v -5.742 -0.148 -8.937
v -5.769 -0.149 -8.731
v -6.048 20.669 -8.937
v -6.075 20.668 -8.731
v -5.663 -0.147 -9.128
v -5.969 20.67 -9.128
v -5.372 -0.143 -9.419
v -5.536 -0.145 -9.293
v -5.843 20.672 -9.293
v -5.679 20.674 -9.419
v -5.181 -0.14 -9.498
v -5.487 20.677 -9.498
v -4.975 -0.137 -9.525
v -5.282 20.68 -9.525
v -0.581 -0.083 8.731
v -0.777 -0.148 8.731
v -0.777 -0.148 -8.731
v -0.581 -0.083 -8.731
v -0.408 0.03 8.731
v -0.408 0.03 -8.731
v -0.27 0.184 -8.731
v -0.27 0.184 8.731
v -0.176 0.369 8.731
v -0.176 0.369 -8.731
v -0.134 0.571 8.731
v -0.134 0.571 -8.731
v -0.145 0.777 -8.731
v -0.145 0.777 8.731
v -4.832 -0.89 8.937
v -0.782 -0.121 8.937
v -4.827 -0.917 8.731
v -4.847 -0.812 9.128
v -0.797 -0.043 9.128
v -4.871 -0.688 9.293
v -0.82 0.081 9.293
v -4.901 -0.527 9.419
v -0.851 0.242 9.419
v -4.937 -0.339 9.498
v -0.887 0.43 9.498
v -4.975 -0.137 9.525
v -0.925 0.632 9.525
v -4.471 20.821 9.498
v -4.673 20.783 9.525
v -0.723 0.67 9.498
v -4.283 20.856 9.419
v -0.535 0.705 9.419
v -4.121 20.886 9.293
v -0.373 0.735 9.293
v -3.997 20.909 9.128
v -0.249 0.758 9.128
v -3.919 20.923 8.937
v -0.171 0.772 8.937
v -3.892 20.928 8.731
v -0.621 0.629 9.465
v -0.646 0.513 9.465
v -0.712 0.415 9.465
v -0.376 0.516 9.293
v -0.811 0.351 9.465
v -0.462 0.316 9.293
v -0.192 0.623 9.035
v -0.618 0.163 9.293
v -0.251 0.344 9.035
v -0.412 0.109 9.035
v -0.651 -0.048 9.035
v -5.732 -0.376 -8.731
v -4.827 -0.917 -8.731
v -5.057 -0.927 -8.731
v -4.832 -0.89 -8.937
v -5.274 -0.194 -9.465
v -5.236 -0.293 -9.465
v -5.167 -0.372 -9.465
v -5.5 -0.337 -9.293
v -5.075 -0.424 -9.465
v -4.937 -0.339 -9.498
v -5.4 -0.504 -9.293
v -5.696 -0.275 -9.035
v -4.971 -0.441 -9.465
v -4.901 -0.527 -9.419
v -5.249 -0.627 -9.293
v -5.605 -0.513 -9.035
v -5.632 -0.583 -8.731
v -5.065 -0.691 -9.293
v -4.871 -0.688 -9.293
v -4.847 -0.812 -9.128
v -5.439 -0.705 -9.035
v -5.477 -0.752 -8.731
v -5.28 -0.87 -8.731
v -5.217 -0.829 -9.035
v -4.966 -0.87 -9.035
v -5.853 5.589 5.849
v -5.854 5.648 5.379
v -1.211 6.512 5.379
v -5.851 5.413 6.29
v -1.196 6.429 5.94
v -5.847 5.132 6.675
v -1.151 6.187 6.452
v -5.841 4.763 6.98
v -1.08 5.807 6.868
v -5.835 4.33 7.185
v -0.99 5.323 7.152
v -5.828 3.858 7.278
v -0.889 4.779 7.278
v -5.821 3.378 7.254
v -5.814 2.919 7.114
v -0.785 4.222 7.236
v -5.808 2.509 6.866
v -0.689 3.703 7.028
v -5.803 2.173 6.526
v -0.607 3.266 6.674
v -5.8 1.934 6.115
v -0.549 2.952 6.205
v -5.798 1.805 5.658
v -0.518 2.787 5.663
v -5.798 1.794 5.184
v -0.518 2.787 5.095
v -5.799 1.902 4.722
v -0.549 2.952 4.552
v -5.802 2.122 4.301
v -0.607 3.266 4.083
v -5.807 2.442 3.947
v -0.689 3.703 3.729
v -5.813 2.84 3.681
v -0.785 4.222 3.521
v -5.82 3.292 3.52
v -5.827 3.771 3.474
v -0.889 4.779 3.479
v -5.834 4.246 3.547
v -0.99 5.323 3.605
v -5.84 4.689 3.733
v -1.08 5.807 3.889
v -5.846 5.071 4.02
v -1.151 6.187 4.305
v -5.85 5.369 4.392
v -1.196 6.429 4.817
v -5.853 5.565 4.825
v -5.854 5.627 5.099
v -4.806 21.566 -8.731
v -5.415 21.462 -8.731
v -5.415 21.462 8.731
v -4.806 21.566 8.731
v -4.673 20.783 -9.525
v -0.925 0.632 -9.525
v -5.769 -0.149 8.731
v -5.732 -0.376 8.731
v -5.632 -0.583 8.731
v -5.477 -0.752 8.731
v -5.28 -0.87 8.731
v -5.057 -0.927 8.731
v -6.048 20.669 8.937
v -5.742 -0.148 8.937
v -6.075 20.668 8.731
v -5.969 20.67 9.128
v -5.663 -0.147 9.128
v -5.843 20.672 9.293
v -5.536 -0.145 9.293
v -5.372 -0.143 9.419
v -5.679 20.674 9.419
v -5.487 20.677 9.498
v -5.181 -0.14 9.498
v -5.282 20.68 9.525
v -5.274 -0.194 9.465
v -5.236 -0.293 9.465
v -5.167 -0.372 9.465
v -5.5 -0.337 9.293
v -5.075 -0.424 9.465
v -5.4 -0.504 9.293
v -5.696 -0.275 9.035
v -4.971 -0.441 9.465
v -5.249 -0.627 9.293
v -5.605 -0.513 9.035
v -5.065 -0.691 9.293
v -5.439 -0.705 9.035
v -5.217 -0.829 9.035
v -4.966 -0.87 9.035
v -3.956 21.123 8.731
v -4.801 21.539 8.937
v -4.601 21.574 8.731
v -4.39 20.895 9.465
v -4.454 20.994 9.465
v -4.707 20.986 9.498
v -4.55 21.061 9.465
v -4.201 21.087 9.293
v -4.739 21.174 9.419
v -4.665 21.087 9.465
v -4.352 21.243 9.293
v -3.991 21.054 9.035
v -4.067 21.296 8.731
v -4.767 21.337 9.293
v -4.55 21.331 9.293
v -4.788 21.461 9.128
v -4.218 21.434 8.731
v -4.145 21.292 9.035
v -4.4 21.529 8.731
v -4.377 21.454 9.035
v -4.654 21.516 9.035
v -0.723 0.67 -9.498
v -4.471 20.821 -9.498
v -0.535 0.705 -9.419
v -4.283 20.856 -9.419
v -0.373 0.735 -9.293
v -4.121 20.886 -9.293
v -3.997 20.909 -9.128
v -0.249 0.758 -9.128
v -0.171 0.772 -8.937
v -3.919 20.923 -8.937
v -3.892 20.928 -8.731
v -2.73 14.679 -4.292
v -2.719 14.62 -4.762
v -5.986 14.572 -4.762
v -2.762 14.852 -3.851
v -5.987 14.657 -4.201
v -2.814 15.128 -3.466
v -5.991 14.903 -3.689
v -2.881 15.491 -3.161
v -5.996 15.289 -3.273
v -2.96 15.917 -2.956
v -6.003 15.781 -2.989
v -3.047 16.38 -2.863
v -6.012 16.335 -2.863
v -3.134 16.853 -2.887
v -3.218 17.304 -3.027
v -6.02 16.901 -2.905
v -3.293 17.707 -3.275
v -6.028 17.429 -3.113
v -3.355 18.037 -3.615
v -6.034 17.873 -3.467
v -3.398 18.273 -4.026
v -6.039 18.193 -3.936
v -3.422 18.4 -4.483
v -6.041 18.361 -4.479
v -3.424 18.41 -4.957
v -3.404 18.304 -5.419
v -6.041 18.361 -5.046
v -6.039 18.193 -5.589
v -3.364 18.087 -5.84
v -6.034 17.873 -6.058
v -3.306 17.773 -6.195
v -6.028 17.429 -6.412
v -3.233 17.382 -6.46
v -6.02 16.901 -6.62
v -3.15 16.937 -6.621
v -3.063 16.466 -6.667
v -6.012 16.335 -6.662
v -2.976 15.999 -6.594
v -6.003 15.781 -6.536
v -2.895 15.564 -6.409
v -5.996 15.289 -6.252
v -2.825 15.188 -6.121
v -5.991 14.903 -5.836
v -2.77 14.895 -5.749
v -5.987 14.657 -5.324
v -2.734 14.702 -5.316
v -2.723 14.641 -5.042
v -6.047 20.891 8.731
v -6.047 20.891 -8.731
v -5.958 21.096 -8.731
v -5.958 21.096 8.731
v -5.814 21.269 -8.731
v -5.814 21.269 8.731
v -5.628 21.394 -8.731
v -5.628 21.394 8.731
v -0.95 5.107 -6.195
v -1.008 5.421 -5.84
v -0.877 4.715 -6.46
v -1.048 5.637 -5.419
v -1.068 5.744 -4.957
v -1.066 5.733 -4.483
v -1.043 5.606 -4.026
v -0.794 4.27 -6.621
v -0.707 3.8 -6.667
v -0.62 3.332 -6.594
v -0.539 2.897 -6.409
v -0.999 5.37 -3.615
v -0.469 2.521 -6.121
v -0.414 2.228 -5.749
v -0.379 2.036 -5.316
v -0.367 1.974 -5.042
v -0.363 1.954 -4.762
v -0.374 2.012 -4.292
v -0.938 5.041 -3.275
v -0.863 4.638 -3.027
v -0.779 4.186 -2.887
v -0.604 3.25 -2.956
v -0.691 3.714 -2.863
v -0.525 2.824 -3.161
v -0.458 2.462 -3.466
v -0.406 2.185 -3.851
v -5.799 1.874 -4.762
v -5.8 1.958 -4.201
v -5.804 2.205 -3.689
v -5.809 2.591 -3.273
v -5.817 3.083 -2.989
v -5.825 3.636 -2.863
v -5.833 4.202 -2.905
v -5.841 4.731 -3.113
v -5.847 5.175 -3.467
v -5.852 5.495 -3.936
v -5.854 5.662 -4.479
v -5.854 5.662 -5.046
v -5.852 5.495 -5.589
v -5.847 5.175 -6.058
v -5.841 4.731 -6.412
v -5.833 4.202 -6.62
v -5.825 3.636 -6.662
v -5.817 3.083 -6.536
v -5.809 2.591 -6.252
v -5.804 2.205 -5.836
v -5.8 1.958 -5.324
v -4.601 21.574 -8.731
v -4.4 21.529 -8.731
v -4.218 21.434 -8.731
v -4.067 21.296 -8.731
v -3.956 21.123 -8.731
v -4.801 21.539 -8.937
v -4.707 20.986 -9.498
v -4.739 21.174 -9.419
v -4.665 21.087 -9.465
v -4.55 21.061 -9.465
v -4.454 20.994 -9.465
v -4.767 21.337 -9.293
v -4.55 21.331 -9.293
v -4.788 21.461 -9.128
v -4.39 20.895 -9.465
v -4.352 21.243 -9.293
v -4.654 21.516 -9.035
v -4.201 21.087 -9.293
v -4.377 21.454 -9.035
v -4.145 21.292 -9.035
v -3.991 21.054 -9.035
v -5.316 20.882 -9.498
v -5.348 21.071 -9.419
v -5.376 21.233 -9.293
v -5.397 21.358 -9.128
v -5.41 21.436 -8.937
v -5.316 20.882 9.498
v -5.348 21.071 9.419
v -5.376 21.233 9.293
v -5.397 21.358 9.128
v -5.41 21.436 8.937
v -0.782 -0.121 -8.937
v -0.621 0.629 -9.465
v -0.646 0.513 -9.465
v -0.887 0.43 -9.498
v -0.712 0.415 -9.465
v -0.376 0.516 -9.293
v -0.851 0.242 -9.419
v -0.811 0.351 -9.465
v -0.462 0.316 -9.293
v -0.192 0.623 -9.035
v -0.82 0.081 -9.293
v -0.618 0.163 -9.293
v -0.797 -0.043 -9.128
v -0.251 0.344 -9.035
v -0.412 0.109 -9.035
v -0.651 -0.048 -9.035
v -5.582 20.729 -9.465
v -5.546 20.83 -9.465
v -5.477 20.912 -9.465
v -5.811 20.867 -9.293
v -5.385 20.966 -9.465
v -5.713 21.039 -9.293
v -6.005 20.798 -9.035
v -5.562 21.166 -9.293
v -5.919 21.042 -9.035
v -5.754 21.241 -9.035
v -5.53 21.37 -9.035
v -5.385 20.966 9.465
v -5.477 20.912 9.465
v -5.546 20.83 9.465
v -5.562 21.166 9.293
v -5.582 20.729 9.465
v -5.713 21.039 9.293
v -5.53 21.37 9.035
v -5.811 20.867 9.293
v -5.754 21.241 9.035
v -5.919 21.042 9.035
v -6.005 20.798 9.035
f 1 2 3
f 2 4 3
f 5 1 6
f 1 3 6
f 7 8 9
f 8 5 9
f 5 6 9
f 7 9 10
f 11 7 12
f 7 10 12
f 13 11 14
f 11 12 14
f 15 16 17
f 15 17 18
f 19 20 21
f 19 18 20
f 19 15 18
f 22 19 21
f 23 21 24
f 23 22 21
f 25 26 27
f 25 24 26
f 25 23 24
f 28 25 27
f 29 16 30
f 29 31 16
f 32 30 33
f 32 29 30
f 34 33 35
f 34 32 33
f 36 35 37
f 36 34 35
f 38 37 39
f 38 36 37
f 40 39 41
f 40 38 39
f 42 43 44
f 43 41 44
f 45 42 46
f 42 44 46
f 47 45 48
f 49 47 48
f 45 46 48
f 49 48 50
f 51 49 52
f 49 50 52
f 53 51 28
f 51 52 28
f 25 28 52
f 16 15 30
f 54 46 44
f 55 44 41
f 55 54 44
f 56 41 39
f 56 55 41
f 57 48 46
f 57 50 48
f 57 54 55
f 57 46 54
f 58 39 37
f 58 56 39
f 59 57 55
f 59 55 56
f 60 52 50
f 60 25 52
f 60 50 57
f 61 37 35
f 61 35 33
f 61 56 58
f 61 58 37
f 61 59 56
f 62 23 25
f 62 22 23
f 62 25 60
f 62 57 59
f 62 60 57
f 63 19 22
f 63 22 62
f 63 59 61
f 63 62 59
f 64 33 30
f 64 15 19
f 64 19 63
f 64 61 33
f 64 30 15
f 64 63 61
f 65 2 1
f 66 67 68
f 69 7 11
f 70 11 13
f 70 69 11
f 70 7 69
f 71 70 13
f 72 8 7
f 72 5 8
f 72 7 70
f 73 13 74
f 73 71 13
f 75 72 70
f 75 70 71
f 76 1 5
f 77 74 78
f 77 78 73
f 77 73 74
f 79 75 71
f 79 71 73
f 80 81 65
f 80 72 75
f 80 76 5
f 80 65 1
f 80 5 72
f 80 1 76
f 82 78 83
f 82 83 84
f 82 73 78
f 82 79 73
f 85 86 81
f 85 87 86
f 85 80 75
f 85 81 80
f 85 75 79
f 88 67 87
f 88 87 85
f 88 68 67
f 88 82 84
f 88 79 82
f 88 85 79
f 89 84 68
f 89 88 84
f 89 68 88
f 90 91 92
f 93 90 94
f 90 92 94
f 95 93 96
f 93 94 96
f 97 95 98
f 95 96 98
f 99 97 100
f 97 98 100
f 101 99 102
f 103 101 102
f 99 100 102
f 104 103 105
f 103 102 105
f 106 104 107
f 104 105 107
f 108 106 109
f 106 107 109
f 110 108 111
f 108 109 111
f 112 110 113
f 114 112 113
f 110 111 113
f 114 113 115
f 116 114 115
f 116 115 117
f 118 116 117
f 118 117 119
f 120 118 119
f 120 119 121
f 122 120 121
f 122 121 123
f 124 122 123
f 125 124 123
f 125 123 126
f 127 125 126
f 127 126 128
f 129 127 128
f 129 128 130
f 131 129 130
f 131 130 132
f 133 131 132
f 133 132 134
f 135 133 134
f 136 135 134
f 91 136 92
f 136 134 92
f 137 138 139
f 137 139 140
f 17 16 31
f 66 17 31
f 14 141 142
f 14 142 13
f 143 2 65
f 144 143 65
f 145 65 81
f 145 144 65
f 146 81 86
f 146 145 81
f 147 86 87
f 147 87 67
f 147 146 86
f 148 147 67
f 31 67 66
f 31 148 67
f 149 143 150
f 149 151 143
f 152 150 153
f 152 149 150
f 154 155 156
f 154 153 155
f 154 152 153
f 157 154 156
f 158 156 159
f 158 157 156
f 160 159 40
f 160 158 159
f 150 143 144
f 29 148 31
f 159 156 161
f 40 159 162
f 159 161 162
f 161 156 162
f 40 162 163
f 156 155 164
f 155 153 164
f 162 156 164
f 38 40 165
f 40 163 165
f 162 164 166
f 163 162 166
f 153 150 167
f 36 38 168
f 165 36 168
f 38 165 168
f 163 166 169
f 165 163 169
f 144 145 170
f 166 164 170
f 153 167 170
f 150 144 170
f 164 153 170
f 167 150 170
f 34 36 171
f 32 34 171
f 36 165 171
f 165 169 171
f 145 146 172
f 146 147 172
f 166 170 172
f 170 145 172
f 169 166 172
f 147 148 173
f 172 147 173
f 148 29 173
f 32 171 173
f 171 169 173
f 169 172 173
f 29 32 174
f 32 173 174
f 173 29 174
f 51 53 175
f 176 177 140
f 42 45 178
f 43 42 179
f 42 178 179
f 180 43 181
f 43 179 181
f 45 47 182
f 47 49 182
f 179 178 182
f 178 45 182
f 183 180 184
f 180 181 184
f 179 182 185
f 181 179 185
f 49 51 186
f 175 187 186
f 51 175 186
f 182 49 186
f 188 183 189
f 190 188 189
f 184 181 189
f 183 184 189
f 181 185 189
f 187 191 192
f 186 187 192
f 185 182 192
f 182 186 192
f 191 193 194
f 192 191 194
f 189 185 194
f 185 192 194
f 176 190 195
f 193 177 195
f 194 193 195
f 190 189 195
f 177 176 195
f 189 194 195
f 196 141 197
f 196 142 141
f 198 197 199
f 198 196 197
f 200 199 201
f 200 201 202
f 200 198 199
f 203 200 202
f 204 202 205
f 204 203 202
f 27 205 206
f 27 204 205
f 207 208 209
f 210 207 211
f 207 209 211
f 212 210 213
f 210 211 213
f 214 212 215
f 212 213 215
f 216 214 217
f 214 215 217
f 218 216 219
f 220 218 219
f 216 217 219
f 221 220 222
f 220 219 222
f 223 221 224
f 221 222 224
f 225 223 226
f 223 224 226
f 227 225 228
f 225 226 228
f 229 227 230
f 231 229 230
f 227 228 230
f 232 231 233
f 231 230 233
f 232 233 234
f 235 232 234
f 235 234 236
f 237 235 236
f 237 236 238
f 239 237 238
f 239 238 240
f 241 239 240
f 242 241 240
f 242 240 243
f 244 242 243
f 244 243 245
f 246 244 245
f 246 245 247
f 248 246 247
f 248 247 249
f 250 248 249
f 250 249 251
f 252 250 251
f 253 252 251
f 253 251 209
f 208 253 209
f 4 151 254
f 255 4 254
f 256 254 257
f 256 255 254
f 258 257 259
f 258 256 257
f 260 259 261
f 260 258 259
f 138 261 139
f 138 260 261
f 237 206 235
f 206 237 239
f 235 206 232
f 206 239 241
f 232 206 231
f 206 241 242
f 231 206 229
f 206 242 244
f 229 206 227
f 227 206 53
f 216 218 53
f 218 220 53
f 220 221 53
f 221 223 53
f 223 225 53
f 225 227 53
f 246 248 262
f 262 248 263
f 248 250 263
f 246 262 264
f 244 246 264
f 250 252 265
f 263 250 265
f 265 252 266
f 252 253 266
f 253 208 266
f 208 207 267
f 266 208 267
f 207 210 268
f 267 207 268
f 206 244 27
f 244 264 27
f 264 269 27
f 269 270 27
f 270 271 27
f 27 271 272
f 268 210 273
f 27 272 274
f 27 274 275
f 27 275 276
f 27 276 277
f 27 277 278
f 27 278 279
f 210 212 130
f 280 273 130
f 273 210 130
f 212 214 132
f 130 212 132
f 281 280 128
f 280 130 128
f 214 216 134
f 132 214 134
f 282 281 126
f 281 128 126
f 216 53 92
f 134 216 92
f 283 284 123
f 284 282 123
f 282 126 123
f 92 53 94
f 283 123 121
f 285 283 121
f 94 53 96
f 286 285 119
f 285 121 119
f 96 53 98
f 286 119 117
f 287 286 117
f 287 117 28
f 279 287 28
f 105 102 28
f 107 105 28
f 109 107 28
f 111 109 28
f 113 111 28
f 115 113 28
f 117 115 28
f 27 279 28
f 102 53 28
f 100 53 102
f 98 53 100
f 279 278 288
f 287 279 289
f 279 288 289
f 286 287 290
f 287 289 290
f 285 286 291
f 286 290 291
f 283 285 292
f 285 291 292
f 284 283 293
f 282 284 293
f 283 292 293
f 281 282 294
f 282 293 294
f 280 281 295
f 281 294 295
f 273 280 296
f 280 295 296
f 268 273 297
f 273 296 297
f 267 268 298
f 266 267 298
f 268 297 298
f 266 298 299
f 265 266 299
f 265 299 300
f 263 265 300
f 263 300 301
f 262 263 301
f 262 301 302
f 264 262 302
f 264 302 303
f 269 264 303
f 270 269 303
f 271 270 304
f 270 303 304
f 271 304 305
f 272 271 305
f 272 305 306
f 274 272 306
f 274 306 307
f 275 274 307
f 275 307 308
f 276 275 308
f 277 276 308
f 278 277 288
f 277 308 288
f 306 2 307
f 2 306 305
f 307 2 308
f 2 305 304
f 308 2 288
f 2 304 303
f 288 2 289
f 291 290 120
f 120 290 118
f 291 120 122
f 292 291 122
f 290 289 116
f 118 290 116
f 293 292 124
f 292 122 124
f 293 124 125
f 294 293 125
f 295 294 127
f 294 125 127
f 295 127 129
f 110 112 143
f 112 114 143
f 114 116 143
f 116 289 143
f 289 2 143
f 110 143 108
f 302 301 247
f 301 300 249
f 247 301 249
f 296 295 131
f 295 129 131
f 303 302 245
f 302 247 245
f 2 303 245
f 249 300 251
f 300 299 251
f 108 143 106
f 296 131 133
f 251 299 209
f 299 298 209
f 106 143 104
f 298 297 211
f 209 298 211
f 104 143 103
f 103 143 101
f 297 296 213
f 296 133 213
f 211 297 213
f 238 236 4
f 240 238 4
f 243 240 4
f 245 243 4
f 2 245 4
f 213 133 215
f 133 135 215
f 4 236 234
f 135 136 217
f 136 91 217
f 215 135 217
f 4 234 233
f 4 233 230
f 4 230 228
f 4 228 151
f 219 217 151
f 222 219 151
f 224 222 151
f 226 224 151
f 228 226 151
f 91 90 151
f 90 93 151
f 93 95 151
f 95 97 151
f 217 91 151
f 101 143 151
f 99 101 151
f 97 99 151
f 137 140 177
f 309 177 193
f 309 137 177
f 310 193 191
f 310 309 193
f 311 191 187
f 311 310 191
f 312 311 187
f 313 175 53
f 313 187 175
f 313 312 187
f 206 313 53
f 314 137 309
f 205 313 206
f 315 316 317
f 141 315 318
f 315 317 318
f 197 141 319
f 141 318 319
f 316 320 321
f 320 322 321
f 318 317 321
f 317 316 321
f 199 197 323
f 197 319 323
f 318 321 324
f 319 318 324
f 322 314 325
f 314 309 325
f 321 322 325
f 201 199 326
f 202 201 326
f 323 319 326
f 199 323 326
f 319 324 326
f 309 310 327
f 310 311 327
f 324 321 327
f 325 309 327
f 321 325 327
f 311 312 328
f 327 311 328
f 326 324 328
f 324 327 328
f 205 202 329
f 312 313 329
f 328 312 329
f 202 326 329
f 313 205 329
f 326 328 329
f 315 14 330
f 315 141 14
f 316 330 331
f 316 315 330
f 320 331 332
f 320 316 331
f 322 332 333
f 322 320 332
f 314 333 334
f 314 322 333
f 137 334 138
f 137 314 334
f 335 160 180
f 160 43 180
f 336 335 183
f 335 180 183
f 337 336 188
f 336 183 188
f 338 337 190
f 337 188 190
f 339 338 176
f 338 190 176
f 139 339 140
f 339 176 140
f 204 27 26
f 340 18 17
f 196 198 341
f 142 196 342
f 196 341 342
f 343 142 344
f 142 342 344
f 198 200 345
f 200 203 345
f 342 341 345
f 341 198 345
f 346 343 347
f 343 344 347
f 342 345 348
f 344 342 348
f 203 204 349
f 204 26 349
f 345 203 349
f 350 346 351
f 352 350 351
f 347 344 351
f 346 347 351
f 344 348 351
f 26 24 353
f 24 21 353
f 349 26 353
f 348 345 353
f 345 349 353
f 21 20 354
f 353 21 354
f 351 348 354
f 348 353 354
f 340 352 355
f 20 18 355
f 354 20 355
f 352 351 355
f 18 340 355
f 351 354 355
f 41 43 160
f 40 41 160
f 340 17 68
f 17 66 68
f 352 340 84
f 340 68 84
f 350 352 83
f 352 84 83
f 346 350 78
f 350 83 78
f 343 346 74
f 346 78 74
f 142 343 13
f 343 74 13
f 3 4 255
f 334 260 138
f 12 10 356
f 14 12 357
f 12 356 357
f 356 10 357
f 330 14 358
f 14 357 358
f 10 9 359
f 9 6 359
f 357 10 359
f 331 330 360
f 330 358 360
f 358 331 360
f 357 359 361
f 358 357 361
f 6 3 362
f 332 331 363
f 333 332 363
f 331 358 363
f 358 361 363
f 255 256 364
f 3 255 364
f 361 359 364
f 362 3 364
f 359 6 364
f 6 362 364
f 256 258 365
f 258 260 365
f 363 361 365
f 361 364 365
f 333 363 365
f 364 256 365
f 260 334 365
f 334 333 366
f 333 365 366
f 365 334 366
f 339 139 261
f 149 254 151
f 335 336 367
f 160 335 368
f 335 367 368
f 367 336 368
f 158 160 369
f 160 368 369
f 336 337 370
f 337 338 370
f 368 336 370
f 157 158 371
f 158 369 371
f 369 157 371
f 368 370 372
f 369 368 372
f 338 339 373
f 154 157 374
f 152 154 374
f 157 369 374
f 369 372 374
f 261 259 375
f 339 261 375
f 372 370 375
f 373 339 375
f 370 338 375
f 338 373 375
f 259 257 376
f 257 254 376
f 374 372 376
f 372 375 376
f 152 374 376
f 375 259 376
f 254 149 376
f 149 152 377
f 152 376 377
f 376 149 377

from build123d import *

# Parameters (mm, degrees)
BOSS_EXTRUDE1_DEPTH = 9.525
SKETCH6_R           = 1.905
CUT_EXTRUDE2_DEPTH  = 25.46325319
SKETCH7_R           = 1.905
CUT_EXTRUDE3_DEPTH  = 25.464227008
FILLET1_R           = 0.79375


with BuildPart() as part:
    # Sketch1 → Boss-Extrude1 (new, symmetric)
    with BuildSketch(Plane.XY):
        Polygon((-5.755049727, -1.093010514), (-6.085429683, 21.348472195), (-4.035272706, 21.696550963), (0, 0), align=None)
    extrude(amount=BOSS_EXTRUDE1_DEPTH, both=True)

    # Sketch6 → Cut-Extrude2 (cut, through all)
    with BuildSketch(Plane(origin=(-5.769890331, -0.084943412, 0), x_dir=(0, 0, 1), z_dir=(-0.9998916512998705, -0.014720246628988168, 0))):
        with Locations(Location((-4.7625, 3.863780902, 0), (0, 0, 270))):
            Circle(SKETCH6_R)
        with Locations(Location((-4.7625, 16.563780902, 0), (0, 0, 270))):
            Circle(SKETCH6_R)
    extrude(amount=-CUT_EXTRUDE2_DEPTH, mode=Mode.SUBTRACT)

    # Sketch7 → Cut-Extrude3 (cut, through all)
    with BuildSketch(Plane(origin=(0, 0, 0), x_dir=(0, 0, -1), z_dir=(0.9831405992384419, 0.18285120215376635, 0))):
        with Locations(Location((-5.378603812, 4.71861458, 0), (0, 0, 90))):
            Circle(SKETCH7_R)
    extrude(amount=-CUT_EXTRUDE3_DEPTH, mode=Mode.SUBTRACT)

    # Fillet1
    fillet1_edges = [part.edges().sort_by_distance(p)[0] for p in [
        (-5.060351194, 21.522511579, 9.525),
        (-5.920239705, 10.12773084, 9.525),
        (-2.877524863, -0.546505257, 9.525),
        (-5.920239705, 10.12773084, -9.525),
        (-5.060351194, 21.522511579, -9.525),
        (-2.017636353, 10.848275481, -9.525),
        (-2.877524863, -0.546505257, -9.525),
        (-5.755049727, -1.093010514, 0),
        (-6.085429683, 21.348472195, 0),
        (-4.035272706, 21.696550963, 0),
        (0, 0, 0),
        (-2.017636353, 10.848275481, 9.525),
    ]]
    fillet(fillet1_edges, radius=FILLET1_R)


solid = part.part
